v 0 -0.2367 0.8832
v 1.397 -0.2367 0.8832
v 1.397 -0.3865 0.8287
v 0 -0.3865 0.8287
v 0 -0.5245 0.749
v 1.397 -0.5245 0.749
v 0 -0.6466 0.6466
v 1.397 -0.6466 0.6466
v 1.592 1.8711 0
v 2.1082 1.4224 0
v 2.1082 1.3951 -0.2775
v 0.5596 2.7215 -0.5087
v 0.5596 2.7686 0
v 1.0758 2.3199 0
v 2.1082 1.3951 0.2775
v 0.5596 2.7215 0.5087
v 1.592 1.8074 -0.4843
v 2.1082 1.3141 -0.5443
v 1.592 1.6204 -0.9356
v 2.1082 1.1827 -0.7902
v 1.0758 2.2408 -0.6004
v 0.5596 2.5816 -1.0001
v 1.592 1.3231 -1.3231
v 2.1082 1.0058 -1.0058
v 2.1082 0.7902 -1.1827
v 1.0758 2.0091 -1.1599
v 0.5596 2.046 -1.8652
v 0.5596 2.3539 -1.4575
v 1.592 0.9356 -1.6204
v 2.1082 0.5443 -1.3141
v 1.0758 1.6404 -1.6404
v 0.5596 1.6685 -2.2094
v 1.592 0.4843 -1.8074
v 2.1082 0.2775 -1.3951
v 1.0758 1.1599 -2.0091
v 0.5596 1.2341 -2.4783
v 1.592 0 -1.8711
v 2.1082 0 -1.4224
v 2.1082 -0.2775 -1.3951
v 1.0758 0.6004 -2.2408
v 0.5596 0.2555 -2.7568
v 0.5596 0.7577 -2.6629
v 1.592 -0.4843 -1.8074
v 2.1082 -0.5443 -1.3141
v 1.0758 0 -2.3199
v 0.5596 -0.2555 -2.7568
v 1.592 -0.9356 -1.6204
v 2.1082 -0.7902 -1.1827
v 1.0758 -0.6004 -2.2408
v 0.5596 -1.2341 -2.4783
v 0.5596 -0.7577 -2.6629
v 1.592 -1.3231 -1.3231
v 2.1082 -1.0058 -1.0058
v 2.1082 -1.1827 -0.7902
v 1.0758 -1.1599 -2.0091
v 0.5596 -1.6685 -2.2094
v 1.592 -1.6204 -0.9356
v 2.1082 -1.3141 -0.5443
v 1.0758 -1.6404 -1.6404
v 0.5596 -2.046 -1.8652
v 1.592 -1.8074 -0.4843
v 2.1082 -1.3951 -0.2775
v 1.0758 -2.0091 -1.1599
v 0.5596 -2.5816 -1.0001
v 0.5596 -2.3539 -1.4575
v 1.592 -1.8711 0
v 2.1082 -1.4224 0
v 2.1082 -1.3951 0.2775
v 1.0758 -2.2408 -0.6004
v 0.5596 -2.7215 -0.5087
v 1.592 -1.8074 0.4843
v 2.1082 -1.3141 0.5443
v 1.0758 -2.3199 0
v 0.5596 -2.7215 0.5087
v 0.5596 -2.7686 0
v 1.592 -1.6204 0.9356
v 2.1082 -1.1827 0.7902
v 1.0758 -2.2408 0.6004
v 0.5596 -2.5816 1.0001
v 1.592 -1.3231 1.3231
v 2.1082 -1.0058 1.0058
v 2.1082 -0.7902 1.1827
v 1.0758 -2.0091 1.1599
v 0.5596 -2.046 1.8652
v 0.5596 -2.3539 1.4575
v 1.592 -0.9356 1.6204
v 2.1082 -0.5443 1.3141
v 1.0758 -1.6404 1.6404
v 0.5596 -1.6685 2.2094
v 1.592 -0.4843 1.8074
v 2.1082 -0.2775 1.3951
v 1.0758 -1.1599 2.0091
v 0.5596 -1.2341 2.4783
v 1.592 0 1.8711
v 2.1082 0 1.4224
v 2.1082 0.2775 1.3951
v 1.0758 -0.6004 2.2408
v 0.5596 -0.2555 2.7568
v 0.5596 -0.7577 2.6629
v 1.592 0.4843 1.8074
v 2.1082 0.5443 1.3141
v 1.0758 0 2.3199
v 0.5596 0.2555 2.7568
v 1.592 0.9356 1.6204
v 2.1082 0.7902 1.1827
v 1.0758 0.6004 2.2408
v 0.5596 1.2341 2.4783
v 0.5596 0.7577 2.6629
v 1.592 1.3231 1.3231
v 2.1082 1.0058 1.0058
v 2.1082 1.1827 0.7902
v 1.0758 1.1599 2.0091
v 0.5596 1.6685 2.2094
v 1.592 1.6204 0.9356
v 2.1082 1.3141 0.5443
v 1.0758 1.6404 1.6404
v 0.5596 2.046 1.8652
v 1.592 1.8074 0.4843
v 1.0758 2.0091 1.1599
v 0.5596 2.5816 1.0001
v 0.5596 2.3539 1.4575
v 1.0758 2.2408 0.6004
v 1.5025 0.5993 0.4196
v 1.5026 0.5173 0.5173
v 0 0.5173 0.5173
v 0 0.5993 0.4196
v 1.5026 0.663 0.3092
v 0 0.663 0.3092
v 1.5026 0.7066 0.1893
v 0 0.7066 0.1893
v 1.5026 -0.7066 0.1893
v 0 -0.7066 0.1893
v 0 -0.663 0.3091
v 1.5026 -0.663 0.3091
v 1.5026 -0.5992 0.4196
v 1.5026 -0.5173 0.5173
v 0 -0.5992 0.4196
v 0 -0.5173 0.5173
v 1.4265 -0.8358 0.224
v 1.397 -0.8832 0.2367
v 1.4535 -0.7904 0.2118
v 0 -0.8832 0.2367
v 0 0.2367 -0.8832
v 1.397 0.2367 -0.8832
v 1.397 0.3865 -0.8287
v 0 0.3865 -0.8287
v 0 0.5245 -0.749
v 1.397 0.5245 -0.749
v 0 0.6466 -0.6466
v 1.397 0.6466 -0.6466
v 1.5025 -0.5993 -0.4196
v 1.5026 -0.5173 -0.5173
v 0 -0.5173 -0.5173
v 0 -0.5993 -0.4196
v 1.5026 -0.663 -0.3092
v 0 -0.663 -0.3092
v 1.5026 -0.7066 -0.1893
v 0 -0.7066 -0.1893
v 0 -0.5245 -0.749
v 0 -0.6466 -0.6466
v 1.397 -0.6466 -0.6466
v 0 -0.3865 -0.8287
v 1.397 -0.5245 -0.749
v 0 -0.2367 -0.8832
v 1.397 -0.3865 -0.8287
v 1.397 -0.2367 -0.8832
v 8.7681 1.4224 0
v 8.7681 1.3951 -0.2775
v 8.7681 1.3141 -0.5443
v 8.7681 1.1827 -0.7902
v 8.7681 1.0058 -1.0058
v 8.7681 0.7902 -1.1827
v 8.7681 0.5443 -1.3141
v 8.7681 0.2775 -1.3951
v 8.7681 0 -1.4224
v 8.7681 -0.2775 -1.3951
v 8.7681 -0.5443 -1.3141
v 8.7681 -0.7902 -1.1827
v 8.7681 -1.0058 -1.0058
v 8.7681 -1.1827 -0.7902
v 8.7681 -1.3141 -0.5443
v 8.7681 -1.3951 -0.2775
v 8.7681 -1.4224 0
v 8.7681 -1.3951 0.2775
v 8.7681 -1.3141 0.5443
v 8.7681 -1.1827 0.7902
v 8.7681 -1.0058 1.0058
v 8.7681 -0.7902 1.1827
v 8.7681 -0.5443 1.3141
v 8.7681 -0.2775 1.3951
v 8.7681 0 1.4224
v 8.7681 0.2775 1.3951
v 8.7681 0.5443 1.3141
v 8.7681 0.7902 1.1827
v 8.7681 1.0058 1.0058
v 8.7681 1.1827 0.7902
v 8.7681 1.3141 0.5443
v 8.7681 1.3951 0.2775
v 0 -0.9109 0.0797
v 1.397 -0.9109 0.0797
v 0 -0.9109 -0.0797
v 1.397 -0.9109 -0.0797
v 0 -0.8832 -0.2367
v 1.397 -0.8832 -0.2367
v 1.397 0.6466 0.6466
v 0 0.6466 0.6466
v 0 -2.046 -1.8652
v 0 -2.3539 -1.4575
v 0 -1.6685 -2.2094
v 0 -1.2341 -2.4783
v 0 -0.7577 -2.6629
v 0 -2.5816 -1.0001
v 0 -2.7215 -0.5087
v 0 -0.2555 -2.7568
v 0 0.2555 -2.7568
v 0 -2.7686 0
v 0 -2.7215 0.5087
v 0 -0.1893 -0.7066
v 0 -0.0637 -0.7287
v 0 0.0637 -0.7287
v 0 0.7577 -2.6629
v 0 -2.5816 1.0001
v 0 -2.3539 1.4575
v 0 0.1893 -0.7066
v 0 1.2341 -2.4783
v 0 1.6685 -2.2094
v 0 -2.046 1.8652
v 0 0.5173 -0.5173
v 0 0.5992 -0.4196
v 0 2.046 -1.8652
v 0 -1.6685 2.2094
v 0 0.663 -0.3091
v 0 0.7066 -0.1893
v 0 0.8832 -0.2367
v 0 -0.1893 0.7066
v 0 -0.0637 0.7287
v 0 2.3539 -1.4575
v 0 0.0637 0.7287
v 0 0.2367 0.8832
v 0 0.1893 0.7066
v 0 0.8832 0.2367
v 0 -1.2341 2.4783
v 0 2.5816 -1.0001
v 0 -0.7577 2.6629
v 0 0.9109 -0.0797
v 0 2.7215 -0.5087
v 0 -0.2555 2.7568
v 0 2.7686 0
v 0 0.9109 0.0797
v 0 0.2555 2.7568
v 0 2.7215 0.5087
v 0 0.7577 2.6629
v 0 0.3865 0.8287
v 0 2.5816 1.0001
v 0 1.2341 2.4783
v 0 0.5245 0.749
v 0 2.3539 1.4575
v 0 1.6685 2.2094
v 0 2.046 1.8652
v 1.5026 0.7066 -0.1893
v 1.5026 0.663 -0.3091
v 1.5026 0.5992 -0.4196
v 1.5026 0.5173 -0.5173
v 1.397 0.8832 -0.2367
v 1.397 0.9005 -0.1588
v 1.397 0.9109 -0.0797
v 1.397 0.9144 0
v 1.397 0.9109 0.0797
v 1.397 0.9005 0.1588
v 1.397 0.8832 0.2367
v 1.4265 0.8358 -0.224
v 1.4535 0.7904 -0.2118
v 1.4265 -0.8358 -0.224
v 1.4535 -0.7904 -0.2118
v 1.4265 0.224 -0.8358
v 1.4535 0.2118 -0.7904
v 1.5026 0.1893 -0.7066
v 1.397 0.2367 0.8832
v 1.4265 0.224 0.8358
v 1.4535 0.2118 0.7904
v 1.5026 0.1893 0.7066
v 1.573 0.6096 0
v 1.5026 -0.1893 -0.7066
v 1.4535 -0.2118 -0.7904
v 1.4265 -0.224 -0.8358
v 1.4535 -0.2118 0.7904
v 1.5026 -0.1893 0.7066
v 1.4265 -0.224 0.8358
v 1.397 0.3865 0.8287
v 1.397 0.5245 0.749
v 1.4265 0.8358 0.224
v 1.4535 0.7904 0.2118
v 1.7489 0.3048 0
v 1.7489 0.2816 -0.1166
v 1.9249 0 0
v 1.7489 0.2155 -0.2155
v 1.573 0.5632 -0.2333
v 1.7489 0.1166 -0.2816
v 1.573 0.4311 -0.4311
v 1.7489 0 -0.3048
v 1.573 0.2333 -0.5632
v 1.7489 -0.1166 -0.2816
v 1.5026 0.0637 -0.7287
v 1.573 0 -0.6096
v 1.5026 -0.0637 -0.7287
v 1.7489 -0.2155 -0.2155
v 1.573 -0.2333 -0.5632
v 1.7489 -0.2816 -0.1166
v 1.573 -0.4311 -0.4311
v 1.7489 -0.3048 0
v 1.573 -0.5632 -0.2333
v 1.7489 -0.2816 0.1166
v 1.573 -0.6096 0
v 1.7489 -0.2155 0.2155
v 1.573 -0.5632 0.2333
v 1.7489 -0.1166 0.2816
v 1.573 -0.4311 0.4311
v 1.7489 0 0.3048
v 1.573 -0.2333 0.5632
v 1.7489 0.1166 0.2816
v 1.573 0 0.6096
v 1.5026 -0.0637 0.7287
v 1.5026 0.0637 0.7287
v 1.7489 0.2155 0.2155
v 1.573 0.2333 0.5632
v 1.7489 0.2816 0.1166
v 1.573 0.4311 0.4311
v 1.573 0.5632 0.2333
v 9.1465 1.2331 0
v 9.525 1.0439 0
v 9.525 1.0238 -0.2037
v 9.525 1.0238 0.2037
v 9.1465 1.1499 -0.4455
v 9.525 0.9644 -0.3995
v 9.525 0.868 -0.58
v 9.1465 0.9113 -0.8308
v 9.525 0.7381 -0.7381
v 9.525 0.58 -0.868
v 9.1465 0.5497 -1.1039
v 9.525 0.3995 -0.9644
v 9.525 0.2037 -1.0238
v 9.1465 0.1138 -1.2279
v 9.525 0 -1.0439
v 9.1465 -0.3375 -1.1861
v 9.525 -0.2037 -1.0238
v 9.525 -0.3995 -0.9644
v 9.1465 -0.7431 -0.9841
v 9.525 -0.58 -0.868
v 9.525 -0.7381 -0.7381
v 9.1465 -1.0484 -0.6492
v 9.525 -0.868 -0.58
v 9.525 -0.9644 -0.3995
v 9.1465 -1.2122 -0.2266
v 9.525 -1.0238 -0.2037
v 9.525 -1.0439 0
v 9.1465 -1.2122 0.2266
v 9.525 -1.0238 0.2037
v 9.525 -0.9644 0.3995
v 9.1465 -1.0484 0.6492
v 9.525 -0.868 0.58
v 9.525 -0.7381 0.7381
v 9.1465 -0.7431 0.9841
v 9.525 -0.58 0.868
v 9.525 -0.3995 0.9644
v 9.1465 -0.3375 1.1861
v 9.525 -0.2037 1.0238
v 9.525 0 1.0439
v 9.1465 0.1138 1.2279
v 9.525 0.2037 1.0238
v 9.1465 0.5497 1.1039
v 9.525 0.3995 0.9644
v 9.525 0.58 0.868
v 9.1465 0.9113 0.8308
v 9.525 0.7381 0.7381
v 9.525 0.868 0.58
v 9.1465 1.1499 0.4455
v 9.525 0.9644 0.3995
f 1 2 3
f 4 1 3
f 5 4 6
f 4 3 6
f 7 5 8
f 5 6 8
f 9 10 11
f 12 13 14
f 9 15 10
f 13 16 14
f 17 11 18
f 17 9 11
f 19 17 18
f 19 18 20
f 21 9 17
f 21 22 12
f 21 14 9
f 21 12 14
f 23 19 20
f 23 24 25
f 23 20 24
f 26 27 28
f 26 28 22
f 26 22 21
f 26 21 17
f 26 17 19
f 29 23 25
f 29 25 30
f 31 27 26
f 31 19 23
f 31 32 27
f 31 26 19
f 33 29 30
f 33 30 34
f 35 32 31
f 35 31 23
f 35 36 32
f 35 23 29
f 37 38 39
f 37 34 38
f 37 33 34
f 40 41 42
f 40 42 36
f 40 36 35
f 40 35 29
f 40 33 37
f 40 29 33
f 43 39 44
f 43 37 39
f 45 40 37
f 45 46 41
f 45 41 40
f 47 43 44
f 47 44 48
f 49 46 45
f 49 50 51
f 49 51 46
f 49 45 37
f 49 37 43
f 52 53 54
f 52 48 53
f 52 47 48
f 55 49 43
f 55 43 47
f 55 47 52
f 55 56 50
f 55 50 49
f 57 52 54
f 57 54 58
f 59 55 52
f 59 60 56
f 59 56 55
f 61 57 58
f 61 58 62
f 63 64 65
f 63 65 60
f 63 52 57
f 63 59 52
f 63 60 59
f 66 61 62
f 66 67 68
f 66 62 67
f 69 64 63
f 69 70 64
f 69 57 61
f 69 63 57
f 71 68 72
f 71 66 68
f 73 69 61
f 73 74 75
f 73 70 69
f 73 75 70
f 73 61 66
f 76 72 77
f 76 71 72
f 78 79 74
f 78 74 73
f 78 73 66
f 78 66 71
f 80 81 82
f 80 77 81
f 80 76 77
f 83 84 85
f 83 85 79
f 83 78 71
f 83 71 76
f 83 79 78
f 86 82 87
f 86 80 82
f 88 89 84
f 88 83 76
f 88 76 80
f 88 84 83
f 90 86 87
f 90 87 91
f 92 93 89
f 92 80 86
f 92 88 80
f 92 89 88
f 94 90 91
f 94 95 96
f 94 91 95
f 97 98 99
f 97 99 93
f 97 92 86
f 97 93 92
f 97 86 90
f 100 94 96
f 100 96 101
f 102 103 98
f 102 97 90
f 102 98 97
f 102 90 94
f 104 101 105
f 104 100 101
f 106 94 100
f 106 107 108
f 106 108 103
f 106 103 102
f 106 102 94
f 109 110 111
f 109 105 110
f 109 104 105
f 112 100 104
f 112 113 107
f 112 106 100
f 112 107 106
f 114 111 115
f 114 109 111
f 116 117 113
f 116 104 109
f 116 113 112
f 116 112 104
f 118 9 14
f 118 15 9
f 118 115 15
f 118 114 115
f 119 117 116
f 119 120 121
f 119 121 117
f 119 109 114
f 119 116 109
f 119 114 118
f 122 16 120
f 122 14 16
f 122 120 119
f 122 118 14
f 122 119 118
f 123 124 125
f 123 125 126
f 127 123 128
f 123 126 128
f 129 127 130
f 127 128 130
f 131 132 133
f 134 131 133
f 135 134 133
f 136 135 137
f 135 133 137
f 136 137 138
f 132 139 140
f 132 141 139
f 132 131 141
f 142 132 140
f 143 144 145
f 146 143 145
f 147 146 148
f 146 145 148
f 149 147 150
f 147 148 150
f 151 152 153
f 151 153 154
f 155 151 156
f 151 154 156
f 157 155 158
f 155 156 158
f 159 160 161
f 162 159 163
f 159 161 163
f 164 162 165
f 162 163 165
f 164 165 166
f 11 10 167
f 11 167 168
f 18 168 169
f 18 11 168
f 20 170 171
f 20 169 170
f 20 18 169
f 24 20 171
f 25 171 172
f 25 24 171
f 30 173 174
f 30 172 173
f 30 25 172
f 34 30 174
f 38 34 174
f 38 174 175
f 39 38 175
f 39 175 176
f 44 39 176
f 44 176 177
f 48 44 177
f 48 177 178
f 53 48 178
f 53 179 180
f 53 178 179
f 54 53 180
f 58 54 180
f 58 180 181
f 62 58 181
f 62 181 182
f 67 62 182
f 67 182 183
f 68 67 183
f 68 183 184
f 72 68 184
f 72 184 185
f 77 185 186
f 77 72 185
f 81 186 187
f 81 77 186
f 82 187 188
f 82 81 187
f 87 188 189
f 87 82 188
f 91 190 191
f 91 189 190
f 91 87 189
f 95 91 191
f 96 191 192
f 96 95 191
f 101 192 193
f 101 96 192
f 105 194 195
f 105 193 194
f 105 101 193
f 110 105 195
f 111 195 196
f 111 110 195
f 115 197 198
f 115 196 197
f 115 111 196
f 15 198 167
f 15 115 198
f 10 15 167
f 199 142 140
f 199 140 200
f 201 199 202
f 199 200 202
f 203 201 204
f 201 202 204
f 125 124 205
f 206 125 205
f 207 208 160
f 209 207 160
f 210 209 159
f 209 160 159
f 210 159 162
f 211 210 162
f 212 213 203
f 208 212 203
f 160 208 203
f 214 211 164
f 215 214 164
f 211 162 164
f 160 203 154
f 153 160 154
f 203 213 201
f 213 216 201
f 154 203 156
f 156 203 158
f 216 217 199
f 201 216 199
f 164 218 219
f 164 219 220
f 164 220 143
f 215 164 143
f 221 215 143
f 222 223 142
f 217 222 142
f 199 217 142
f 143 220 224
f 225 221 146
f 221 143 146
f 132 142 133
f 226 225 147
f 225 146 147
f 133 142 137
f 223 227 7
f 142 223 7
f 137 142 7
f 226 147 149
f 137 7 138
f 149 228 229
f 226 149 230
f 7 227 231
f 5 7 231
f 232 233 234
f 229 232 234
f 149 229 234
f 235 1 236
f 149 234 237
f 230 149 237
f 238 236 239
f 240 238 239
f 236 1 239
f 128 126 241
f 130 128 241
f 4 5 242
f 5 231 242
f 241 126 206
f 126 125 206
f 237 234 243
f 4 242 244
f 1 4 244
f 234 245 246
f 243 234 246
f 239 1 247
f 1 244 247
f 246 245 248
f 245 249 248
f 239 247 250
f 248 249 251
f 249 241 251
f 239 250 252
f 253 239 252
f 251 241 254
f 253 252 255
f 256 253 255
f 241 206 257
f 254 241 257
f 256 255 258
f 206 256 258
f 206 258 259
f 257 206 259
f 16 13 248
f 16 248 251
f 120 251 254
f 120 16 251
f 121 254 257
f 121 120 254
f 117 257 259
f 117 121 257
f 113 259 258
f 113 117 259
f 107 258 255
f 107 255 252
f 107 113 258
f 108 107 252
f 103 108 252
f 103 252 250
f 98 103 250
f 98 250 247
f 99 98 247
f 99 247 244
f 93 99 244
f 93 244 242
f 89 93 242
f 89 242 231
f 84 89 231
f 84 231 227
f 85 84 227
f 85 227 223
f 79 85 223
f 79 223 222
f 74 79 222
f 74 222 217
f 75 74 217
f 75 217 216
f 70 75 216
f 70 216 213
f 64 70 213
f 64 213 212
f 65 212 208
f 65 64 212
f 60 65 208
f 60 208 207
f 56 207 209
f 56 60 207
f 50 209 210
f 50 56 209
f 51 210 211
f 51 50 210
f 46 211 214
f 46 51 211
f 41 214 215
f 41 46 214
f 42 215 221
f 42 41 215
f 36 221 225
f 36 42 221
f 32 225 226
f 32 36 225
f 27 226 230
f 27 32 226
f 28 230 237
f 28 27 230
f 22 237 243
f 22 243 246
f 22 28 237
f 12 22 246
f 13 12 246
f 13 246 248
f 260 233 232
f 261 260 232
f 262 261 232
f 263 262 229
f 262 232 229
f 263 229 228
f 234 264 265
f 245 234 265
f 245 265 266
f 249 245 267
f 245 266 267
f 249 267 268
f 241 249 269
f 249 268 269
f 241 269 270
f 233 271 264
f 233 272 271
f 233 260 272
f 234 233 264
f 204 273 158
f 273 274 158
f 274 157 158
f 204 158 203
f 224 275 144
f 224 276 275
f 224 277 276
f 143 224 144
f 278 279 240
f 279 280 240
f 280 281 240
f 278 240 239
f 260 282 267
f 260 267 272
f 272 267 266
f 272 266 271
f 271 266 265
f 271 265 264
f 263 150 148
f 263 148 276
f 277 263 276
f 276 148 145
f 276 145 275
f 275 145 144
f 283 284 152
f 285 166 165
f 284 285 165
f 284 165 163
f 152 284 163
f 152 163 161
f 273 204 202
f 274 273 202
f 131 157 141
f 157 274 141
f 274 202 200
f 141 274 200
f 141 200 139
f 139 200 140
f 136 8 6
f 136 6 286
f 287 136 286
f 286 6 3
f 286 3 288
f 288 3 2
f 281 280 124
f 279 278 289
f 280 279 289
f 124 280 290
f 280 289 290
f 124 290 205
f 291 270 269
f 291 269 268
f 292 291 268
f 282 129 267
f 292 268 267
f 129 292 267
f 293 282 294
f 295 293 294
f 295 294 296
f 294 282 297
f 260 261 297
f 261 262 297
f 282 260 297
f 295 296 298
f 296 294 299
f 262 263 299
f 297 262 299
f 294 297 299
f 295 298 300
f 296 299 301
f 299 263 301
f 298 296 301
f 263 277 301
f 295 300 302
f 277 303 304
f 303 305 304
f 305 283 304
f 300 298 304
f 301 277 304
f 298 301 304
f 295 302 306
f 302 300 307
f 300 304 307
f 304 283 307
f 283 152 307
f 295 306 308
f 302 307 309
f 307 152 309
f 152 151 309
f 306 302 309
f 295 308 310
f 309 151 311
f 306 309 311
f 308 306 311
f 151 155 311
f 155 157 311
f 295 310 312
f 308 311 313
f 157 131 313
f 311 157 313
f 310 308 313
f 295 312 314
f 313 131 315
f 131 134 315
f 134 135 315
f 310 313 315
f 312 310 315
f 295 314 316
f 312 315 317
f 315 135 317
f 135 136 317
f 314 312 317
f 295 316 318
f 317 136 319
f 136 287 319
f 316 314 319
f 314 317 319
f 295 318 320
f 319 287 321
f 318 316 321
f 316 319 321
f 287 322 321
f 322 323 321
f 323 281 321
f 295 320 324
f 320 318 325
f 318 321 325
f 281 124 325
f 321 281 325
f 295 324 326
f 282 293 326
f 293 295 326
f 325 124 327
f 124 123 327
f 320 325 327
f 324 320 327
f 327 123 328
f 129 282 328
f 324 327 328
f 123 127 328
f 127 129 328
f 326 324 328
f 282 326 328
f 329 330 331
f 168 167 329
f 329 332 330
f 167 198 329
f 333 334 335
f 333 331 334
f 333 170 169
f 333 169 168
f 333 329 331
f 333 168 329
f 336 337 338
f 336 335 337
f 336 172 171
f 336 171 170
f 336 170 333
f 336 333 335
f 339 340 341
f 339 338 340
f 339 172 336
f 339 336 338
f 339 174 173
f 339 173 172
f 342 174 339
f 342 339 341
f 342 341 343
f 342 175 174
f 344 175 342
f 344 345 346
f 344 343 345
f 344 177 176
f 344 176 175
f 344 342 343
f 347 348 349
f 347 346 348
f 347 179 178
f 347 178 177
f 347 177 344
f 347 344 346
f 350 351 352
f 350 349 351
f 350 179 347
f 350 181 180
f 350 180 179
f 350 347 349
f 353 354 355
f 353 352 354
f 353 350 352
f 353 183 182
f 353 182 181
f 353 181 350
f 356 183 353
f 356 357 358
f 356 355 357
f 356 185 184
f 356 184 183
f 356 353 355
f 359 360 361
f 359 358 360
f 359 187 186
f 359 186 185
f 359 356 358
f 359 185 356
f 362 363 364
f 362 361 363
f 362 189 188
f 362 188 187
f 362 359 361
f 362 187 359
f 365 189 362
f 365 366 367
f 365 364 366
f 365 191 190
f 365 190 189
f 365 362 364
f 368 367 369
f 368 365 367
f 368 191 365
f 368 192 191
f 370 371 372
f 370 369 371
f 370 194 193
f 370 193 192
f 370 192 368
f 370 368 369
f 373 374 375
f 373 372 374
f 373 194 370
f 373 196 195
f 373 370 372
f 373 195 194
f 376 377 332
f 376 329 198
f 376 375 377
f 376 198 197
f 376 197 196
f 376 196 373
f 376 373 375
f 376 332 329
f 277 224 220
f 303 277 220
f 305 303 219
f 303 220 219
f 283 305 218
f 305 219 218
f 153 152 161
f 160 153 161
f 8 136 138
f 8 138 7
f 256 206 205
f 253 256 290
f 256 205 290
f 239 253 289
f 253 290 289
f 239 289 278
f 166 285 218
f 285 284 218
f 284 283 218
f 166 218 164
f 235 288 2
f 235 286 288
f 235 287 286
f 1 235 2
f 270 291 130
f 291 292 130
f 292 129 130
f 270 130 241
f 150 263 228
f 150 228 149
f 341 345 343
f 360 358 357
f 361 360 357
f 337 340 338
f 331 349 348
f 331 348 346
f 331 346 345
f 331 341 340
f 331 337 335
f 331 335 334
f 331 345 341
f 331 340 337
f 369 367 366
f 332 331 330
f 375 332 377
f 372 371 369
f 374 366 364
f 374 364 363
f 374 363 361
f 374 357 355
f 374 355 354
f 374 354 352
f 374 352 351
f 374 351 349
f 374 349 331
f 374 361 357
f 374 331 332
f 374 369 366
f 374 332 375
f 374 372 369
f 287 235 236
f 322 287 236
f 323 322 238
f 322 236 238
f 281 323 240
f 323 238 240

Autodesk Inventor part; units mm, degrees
ref_plane "YZ Plane" through (0, 0, 0) normal (1, 0, 0) x (0, 1, 0)
ref_plane "XZ Plane" through (0, 0, 0) normal (0, 1, 0) x (-1, 0, 0)
sketch "Szkic1" plane through (0, 0, 0) normal (0, 0, 1) x (1, 0, 0)
  line L0 (9.525, 0) -> (9.525, 1.4224)
  line L1 (9.525, 1.4224) -> (2.1082, 1.4224)
  line L2 (0, 2.7686) -> (0, 0.9144)
  line L3 (0, 0.9144) -> (1.397, 0.9144)
  line L4 (1.397, 0.9144) -> (1.9249, 0)
  line L5 (1.9249, 0) -> (9.525, 0)
  line L6 (0, 2.7686) -> (0.5596, 2.7686)
  line L7 (0.5596, 2.7686) -> (2.1082, 1.4224)
  line L8 (-1.905, 0) -> (11.43, 0) projected
  line L9 (0, -0.5537) -> (0, 3.3223) projected
  dimension "d0" = 9.525
  dimension "d1" = 1.397
  dimension "d2" = 2.8448
  dimension "d3" = 2.1082
  dimension "d4" = 41
  dimension "d5" = 1.8288
  dimension "d6" = 60
  dimension "d7" = 5.5372
revolve "Bryła" add sketch "Szkic1" angle 360 about axis through (1.9249, 0, 0) along (1, 0, 0) contours L5 L4 L3 L2 L6 L7 L1 L0
sketch "Szkic2" plane through (0, 0, 0) normal (-1, 0, 0) x (0, 0, 1)
  circle A0 centre (0, 0) radius 2.7686 projected
  circle A1 centre (0, 0) radius 0.9144 projected
  line L0 (0.7066, 0.1893) -> (0.8832, 0.2367)
  line L1 (0.7066, -0.1893) -> (0.8832, -0.2367)
  arc A2 (0.7066, -0.1893) -> (0.7066, 0.1893) centre (0, 0) ccw
  arc A3 (0.8832, -0.2367) -> (0.8832, 0.2367) centre (0, 0) ccw
  line L2 (0, -3.876) -> (0, 3.876) projected
  line L3 (-3.876, 0) -> (3.876, 0) projected
  line L4 (0.7066, 0.1893) -> (0, 0) construction
  line L5 (0, 0) -> (0.7066, -0.1893) construction
  line L6 (0.1893, 0.7066) -> (0.2367, 0.8832)
  line L7 (0.5173, 0.5173) -> (0.6466, 0.6466)
  arc A4 (0.5173, 0.5173) -> (0.1893, 0.7066) centre (0, 0) ccw
  arc A5 (0.6466, 0.6466) -> (0.2367, 0.8832) centre (0, 0) ccw
  line L8 (-0.5173, 0.5173) -> (-0.6466, 0.6466)
  line L9 (-0.1893, 0.7066) -> (-0.2367, 0.8832)
  arc A6 (-0.1893, 0.7066) -> (-0.5173, 0.5173) centre (0, 0) ccw
  arc A7 (-0.2367, 0.8832) -> (-0.6466, 0.6466) centre (0, 0) ccw
  line L10 (-0.7066, -0.1893) -> (-0.8832, -0.2367)
  line L11 (-0.7066, 0.1893) -> (-0.8832, 0.2367)
  arc A8 (-0.7066, 0.1893) -> (-0.7066, -0.1893) centre (0, 0) ccw
  arc A9 (-0.8832, 0.2367) -> (-0.8832, -0.2367) centre (0, 0) ccw
  line L12 (-0.1893, -0.7066) -> (-0.2367, -0.8832)
  line L13 (-0.5173, -0.5173) -> (-0.6466, -0.6466)
  arc A10 (-0.5173, -0.5173) -> (-0.1893, -0.7066) centre (0, 0) ccw
  arc A11 (-0.6466, -0.6466) -> (-0.2367, -0.8832) centre (0, 0) ccw
  line L14 (0.5173, -0.5173) -> (0.6466, -0.6466)
  line L15 (0.1893, -0.7066) -> (0.2367, -0.8832)
  arc A12 (0.1893, -0.7066) -> (0.5173, -0.5173) centre (0, 0) ccw
  arc A13 (0.2367, -0.8832) -> (0.6466, -0.6466) centre (0, 0) ccw
  dimension "d8" = 1.463
  dimension "d9" = 1.8288
  dimension "d10" = 15
  dimension "d11" = 15
  dimension "d22" = 360
extrude "Szczelina" add sketch "Szkic2" against normal up to next contours L3 A2 L0 A1 | A1 L1 A2 L3 | L3 A8 L10 A1 | A1 L11 A8 L3 | A1 L7 A4 L6 | L9 A6 L8 A1 | A1 L13 A10 L12 | L15 A12 L14 A1
thread "Gwint" size "4-40 UNC" class "2A" standard "ANSI Unified Screw Threads" length 5.8293
chamfer "Faza1" distance 0.3785 distance2 0.7569 1 edges at (9.525, -1.4224, 0) measured on face at (9.525, -0.1427, 0.3949)
ref_plane "Work Plane1" through (66.6877, 0, 0) normal (0, 0, -1) x (1, 0, 0)
equation "\"d0\" = NLG"
equation "\"d1\" = INTI"
equation "\"d2\" = GD"
equation "\"d3\" = KOH"
equation "\"d4\" = 0.5 * SEWI"
equation "\"d5\" = SW"
equation "\"d7\" = KOD"
equation "\"d8\" = 0.8 * SW"
equation "\"d9\" = SW"
equation "\"d15\" = GEL"
equation "\"d17\" = -0.5 * SPD + 0.5 * GD"
equation "\"d18\" = GUL"
equation "\"NLG\" = 9.525"
equation "\"SW\" = 1.8288"
equation "\"INTI\" = 1.397"
equation "\"GEL\" = 5.8293"
equation "\"KOH\" = 2.1082"
equation "\"KOD\" = 5.5372"
equation "\"GUL\" = 0.75692"
equation "\"SPD\" = 2.08788"
equation "\"GD\" = NND"
equation "\"SEWI\" = 82deg"
equation "\"TOA\" = 30deg"
equation "\"GD1\" = SPD"
equation "\"EPV\" = 3.74448"
equation "\"THREADDIA\" = 2.8448"
equation "\"BDM\" = NND"
equation "\"NND\" = 2.8448"
equation "\"GAL\" = 1.5875"
equation "\"E0\" = 1.155 * SW"
properties part number "ANSI B18.3 - 4-40 UNC x 0,375" material "Stal, miękka"
